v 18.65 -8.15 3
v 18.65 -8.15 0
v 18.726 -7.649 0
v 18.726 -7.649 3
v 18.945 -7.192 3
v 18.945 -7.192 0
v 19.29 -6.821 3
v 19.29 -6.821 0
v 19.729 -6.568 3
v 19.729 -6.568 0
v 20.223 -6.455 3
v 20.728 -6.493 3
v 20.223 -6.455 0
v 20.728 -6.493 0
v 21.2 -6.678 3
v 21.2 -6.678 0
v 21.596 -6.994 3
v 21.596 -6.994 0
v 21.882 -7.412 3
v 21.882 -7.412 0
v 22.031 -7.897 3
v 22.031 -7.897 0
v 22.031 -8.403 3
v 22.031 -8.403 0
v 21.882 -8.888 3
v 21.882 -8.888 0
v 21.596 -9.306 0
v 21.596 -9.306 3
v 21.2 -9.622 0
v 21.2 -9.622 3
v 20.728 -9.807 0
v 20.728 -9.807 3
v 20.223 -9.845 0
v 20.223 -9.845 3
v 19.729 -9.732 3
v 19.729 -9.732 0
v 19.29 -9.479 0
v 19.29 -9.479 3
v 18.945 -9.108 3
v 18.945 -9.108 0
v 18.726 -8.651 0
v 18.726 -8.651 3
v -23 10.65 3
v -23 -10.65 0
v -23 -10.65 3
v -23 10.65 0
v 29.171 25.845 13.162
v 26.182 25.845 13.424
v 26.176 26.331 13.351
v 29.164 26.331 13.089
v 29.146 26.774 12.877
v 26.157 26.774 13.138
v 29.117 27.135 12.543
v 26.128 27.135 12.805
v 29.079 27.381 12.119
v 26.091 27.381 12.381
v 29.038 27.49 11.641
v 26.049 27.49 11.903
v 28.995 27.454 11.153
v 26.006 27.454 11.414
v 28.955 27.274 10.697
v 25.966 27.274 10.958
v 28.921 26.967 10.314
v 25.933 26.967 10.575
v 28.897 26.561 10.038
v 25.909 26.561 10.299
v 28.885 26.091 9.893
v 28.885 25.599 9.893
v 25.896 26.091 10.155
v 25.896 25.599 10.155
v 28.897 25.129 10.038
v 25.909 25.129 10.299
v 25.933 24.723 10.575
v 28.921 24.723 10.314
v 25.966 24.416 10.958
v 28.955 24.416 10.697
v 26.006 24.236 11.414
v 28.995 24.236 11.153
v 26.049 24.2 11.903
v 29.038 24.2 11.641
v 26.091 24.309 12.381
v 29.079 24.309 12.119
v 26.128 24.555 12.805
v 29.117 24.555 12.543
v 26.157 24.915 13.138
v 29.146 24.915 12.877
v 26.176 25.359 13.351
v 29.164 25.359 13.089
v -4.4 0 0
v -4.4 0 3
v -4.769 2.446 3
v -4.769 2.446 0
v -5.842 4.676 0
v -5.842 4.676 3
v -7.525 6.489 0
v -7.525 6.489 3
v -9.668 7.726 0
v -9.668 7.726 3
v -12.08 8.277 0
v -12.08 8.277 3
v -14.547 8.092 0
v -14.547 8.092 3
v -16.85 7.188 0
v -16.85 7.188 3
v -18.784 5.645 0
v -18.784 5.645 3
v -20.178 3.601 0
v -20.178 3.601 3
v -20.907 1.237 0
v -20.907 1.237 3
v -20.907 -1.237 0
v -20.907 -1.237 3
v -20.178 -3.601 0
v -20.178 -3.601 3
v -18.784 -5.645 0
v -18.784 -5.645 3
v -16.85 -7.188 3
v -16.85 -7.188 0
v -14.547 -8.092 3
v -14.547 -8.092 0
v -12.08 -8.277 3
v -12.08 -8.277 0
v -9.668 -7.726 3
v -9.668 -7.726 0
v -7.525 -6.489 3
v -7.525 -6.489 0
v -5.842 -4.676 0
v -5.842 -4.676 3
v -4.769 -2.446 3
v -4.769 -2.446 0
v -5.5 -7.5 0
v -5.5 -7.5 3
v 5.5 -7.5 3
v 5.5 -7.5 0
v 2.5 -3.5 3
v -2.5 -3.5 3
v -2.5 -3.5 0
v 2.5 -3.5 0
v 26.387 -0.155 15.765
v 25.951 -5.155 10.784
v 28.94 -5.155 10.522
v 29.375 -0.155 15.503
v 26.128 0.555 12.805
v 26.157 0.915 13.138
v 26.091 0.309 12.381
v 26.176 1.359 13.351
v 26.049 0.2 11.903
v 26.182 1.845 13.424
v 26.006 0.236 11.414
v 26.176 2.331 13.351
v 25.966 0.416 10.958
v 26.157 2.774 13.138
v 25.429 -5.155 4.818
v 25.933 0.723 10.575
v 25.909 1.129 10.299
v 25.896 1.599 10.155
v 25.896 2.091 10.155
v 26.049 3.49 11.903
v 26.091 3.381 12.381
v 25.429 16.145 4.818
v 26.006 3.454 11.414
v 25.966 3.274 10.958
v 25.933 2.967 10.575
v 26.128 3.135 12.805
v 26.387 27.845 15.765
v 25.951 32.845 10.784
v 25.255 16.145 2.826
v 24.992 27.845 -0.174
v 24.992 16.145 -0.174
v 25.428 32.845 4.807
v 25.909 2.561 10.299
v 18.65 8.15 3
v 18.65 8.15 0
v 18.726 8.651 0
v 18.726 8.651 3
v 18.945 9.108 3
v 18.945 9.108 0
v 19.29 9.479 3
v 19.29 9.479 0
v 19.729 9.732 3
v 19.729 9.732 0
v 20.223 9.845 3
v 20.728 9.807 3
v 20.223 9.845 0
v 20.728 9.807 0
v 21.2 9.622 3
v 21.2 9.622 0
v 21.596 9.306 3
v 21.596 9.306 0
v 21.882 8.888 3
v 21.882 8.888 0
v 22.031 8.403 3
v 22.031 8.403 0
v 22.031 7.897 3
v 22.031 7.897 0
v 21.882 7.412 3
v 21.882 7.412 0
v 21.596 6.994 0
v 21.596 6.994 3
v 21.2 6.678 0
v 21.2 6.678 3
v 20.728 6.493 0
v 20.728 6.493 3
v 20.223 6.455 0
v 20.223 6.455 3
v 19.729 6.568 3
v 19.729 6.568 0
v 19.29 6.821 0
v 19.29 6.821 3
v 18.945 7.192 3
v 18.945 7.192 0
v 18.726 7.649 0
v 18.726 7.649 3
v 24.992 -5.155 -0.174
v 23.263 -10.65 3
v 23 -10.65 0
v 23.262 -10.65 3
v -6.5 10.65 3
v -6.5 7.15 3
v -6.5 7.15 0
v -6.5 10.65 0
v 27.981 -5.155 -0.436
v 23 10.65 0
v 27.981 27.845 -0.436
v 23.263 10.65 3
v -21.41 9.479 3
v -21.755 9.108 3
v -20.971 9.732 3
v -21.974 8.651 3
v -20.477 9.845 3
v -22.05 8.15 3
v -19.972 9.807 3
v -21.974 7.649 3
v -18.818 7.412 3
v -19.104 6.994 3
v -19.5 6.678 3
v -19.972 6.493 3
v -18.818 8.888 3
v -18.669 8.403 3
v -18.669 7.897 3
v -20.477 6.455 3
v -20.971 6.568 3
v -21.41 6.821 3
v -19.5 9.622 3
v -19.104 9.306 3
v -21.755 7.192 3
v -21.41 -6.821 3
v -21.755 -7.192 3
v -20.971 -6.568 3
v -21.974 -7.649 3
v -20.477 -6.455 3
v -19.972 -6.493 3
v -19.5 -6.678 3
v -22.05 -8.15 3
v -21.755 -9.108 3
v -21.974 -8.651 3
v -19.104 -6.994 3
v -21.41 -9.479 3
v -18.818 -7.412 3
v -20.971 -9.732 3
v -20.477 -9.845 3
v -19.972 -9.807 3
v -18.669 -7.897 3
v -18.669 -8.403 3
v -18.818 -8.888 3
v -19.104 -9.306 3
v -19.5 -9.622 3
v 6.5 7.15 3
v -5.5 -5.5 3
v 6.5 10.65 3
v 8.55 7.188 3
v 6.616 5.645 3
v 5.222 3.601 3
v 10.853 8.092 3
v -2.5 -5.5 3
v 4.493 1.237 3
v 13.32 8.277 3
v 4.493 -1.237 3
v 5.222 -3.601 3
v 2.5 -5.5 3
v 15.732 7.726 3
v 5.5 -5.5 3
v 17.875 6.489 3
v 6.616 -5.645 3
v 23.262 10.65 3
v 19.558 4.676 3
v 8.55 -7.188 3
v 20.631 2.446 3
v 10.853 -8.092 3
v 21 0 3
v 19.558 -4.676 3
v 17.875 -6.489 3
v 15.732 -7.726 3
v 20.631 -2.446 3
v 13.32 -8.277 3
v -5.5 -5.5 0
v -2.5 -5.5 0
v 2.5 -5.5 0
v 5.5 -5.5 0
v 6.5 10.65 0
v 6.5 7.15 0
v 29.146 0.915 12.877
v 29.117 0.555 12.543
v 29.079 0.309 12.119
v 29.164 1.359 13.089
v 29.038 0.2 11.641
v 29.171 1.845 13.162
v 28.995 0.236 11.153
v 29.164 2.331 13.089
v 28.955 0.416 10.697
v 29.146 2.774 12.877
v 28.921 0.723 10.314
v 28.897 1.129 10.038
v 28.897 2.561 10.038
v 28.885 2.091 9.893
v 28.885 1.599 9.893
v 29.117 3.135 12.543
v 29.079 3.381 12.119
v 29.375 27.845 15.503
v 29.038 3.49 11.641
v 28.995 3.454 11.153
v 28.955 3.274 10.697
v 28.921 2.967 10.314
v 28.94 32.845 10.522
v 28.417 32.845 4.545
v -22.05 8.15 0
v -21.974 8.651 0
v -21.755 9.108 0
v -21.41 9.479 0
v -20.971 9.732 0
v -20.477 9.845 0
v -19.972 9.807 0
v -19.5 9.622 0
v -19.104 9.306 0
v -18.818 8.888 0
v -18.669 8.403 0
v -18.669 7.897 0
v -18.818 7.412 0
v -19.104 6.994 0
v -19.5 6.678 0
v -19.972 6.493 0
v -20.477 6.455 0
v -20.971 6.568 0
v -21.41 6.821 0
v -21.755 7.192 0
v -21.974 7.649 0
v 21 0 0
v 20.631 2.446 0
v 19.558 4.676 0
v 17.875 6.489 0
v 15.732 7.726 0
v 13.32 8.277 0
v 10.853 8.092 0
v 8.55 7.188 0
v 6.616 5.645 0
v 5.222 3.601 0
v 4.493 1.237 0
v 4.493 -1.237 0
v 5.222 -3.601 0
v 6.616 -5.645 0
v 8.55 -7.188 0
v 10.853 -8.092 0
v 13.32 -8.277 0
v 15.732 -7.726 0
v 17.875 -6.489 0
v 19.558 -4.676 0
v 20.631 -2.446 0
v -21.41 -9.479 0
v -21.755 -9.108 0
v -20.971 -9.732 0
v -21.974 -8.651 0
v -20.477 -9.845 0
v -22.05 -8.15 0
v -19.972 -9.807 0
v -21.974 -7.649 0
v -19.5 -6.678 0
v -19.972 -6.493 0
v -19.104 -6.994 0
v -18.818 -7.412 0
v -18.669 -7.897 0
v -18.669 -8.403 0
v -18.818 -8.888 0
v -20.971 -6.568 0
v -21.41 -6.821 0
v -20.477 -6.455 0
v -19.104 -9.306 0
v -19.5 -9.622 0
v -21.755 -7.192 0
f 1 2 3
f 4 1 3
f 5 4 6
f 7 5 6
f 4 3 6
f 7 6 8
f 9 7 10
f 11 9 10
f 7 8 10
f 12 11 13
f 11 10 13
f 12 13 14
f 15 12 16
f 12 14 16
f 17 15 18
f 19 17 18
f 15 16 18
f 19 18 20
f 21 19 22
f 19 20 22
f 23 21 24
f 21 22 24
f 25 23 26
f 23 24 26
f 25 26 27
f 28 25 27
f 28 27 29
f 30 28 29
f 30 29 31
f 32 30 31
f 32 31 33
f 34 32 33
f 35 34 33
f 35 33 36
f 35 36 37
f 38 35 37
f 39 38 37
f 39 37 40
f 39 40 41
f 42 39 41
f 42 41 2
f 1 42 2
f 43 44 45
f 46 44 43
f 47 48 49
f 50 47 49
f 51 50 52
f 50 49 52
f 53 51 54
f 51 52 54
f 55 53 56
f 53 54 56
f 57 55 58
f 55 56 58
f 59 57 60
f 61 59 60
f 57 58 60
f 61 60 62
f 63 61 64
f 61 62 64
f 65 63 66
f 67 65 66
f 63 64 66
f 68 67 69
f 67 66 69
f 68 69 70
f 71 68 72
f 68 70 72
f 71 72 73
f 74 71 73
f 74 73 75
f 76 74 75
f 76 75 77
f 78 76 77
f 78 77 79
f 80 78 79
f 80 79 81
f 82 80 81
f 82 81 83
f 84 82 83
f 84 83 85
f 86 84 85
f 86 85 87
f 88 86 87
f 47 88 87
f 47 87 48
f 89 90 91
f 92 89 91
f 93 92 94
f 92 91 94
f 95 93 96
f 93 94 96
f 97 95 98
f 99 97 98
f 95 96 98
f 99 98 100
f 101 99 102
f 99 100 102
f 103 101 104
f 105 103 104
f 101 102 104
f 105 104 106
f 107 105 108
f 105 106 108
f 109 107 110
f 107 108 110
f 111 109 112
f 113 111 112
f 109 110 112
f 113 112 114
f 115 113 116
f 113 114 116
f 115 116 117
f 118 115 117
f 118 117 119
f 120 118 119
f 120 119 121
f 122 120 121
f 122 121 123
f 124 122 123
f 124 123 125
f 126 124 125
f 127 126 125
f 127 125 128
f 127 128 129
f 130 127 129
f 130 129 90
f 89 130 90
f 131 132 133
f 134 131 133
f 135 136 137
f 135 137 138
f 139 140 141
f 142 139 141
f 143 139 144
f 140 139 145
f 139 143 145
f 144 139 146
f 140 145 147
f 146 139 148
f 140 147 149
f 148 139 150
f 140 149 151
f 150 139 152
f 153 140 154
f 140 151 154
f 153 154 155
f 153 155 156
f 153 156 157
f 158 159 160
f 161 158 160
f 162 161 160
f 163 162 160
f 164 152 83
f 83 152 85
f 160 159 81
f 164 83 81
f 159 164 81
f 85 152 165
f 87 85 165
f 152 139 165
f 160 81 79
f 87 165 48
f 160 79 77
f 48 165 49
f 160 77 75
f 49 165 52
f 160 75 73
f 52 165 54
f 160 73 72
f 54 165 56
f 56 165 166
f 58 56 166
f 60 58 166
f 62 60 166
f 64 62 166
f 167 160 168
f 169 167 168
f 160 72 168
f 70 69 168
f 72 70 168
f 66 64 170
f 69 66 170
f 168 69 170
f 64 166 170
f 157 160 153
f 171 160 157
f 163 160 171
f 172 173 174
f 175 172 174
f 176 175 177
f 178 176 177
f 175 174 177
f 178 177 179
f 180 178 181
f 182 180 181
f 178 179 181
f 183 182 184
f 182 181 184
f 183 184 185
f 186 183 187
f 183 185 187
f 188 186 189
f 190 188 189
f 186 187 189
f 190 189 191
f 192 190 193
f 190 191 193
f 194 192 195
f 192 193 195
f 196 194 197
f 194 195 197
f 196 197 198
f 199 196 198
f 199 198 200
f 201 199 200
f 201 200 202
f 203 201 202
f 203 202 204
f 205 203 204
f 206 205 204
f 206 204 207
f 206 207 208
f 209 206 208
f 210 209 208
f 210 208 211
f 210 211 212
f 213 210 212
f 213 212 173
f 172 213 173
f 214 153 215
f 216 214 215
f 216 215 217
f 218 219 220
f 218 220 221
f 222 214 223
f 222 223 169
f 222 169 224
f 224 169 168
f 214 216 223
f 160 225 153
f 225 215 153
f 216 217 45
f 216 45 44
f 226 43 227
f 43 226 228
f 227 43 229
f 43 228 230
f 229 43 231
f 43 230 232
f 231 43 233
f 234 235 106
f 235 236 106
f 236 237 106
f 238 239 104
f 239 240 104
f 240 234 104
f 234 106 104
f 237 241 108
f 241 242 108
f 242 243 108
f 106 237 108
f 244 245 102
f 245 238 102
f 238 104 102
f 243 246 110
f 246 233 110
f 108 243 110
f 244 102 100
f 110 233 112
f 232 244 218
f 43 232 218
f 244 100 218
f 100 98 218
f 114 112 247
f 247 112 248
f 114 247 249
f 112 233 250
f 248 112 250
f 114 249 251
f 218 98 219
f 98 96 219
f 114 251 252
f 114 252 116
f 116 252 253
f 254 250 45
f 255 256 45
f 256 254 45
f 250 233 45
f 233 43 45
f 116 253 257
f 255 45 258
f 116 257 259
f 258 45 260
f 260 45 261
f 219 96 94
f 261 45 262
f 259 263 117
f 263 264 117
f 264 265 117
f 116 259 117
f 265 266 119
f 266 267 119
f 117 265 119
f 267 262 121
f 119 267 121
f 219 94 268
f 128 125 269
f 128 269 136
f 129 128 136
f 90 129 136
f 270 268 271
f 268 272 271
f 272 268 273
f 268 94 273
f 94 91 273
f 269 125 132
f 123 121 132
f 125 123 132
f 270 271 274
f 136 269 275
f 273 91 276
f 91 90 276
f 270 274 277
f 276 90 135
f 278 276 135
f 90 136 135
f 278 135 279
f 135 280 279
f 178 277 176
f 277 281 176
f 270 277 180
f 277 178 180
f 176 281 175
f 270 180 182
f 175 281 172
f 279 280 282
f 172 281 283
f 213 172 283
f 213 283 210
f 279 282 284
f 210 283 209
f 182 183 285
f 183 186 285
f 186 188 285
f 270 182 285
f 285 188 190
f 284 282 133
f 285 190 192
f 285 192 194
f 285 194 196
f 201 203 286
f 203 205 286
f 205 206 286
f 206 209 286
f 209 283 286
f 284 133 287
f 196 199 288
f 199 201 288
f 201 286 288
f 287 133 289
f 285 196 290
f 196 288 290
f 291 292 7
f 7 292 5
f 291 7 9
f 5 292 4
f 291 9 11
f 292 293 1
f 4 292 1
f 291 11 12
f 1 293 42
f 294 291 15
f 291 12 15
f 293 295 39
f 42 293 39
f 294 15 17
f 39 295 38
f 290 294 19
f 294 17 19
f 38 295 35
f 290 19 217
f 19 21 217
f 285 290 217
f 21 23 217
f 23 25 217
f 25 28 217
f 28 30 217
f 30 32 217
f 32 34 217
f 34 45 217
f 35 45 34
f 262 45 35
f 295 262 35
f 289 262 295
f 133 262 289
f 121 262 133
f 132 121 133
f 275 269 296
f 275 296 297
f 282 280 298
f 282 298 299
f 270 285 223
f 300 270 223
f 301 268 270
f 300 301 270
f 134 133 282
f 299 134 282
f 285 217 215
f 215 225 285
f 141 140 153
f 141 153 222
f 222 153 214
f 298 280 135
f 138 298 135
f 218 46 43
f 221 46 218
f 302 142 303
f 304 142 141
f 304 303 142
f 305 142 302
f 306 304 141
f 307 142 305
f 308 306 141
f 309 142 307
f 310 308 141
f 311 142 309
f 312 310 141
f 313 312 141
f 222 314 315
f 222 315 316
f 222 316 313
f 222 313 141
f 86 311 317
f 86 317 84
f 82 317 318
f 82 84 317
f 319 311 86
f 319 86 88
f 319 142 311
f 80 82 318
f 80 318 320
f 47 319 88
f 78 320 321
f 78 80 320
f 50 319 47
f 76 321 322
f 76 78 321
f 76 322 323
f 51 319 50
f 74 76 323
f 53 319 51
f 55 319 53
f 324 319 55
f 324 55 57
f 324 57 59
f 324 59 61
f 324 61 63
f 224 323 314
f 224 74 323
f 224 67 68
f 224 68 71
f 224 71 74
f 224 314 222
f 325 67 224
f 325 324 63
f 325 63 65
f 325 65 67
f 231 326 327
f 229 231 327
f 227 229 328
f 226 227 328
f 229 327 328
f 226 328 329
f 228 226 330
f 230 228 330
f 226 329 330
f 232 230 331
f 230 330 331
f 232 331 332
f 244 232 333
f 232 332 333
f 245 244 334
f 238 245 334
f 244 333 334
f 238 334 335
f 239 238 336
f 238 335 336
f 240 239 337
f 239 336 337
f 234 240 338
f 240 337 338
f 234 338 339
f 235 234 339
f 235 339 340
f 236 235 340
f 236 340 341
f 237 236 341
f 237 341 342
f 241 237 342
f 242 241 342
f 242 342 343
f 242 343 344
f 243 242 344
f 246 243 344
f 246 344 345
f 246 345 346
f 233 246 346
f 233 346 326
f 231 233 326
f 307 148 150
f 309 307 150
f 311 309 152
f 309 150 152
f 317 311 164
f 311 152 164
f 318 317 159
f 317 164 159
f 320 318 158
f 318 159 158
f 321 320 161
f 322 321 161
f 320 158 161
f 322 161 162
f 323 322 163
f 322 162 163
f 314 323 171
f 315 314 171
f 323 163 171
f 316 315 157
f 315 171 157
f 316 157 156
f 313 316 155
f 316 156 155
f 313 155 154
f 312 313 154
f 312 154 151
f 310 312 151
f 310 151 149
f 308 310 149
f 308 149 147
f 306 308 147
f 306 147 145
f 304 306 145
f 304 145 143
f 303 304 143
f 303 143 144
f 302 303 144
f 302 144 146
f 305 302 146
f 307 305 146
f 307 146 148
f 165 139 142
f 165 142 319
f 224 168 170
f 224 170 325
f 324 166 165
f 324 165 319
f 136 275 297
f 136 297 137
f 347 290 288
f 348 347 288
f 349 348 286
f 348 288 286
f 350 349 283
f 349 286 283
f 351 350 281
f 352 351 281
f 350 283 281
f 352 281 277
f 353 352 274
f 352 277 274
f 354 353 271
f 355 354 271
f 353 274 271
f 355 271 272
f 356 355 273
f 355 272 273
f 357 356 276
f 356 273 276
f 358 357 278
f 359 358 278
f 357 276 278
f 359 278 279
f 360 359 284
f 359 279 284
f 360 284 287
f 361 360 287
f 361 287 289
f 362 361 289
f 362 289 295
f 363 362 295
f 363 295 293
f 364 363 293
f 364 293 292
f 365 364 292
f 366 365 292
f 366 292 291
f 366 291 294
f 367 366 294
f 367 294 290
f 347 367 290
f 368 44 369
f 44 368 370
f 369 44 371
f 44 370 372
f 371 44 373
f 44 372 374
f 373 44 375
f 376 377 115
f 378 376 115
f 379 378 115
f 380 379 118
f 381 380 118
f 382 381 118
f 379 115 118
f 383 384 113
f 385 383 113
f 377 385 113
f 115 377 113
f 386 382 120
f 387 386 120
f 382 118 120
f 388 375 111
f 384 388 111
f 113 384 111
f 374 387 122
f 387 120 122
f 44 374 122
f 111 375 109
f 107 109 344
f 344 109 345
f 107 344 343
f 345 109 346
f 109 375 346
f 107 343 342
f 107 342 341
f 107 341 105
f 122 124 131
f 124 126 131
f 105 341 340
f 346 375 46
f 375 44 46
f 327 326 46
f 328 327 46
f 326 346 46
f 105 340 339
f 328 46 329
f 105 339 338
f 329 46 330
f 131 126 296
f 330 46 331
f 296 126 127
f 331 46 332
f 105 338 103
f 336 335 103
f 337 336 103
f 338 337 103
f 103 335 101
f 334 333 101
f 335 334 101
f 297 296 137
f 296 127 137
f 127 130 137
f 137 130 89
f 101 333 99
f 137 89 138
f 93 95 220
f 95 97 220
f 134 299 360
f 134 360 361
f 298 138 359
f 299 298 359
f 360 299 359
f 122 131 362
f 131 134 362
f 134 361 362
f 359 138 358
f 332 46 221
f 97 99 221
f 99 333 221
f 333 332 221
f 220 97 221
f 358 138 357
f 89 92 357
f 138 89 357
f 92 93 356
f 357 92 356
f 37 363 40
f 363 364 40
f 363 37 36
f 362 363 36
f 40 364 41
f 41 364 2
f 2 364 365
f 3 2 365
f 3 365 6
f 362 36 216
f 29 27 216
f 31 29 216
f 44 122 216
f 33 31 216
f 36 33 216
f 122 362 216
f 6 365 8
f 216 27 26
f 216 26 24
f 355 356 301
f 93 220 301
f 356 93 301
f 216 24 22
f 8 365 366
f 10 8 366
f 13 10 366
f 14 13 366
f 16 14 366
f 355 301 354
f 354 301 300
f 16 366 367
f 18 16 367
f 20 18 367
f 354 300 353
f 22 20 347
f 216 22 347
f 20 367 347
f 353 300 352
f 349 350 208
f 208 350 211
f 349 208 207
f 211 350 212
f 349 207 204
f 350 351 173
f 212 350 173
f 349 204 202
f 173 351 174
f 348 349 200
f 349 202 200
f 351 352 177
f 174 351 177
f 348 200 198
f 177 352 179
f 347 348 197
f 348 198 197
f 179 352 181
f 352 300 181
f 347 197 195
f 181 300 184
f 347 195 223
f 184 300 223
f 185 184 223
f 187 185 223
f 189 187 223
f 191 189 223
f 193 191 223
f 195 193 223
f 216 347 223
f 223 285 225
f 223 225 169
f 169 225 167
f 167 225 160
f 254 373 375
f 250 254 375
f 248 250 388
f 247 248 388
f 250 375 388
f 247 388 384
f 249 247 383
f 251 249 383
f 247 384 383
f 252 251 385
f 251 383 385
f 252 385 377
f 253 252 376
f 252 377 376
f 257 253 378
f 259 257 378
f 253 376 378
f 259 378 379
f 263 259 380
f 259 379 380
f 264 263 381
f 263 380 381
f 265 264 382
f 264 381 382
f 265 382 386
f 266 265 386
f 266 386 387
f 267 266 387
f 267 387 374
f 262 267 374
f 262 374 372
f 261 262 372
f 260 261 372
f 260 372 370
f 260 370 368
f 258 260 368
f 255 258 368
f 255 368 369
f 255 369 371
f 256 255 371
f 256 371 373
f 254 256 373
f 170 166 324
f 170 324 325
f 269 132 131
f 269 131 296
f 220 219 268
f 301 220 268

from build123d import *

# Parameters (mm, degrees)
SKETCH_1_W          = 46
SKETCH_1_H          = 21.3
EXTRUDE_1_DEPTH     = 3
SKETCH_2_R          = 8.3
CUT_EXTRUDE_1_DEPTH = 26.522979842
SKETCH_3_W          = 8
SKETCH_3_H          = 3
CUT_EXTRUDE_2_DEPTH = 26.522979842
SKETCH_4_W          = 5
SKETCH_4_H          = 4
CUT_EXTRUDE_3_DEPTH = 26.522979842
SKETCH_5_W          = 3
SKETCH_5_H          = 2
SKETCH_5_W_2        = 2
SKETCH_5_H_2        = 3
CUT_EXTRUDE_4_DEPTH = 1
HOLE_WIZARD_M3_1_D  = 3.4
SKETCH4_W           = 11
SKETCH4_H           = 2
SKETCH4_W_2         = 13
SKETCH4_H_2         = 3.5
CUT_EXTRUDE3_DEPTH  = 26.522979842
BOSS_EXTRUDE2_DEPTH = 21.3
SKETCH7_W           = 3.011459513
SKETCH7_H           = 21.3
BOSS_EXTRUDE3_DEPTH = 2
SKETCH10_W          = 2
SKETCH10_H          = 28.7
BOSS_EXTRUDE5_DEPTH = 3.011459513
CUT_EXTRUDE6_DEPTH  = 47.808991188
SKETCH14_W          = 16
SKETCH14_H          = 38
BOSS_EXTRUDE8_DEPTH = 3
CHAMFER2_SIZE       = 2
SKETCH15_R          = 1.65
CUT_EXTRUDE7_DEPTH  = 61.720869721
CHAMFER3_SIZE       = 5


with BuildPart() as part:
    # 草圖1 → 填料-伸長1 (new body)
    with BuildSketch(Plane.XY):
        Rectangle(SKETCH_1_W, SKETCH_1_H)
    extrude(amount=EXTRUDE_1_DEPTH)

    # 草圖2 → 除料-伸長1 (cut, through all)
    with BuildSketch(Plane.XY.offset(3)):
        with Locations((-12.7, 0)):
            Circle(SKETCH_2_R)
        with Locations((12.7, 0)):
            Circle(SKETCH_2_R)
    extrude(amount=-CUT_EXTRUDE_1_DEPTH, mode=Mode.SUBTRACT)

    # 草圖3 → 除料-伸長2 (cut, through all)
    with BuildSketch(Plane.XY.offset(3)):
        with Locations((0, 9.15)):
            Rectangle(SKETCH_3_W, SKETCH_3_H)
    extrude(amount=-CUT_EXTRUDE_2_DEPTH, mode=Mode.SUBTRACT)

    # 草圖4 → 除料-伸長3 (cut, through all)
    with BuildSketch(Plane.XY.offset(3)):
        with Locations((0, -5.5)):
            Rectangle(SKETCH_4_W, SKETCH_4_H)
    extrude(amount=-CUT_EXTRUDE_3_DEPTH, mode=Mode.SUBTRACT)

    # 草圖5 → 除料-伸長4 (cut)
    with BuildSketch(Plane.XY.offset(3)):
        with Locations((4, -6.5)):
            Rectangle(SKETCH_5_W, SKETCH_5_H)
        with Locations((-5.5, 8.65)):
            Rectangle(SKETCH_5_W_2, SKETCH_5_H_2)
        with Locations((5.5, 8.65)):
            Rectangle(SKETCH_5_W_2, SKETCH_5_H_2)
        with Locations((-4, -6.5)):
            Rectangle(SKETCH_5_W, SKETCH_5_H)
    extrude(amount=-CUT_EXTRUDE_4_DEPTH, mode=Mode.SUBTRACT)

    # M3 餘隙孔1 (through all)
    with Locations(Plane.XY.offset(3)):
        with Locations((20.35, 8.15), (-20.35, -8.15), (-20.35, 8.15), (20.35, -8.15)):
            Hole(HOLE_WIZARD_M3_1_D / 2)

    # Sketch4 → Cut-Extrude3 (cut, through all)
    with BuildSketch(Plane.XY.offset(3)):
        with Locations((0, -6.5)):
            Rectangle(SKETCH4_W, SKETCH4_H)
        with Locations((0, 8.9)):
            Rectangle(SKETCH4_W_2, SKETCH4_H_2)
    extrude(amount=-CUT_EXTRUDE3_DEPTH, mode=Mode.SUBTRACT)

    # Sketch5 → Boss-Extrude2 (add)
    with BuildSketch(Plane(origin=(0, -10.65, 0), x_dir=(-1, 0, 0), z_dir=(0, -1, 0))):
        Polygon((-23, 0), (-23, -3), (-23.262465991, -3), align=None)
    extrude(amount=-BOSS_EXTRUDE2_DEPTH)

    # Sketch7 → Boss-Extrude3 (add)
    with BuildSketch(Plane(origin=(22.82528916, 0, -1.996954043), x_dir=(-0.08715574274765041, 0, -0.9961946980917462), z_dir=(0.9961946980917462, 0, -0.08715574274765041))):
        with Locations((-3.510311839, 0)):
            Rectangle(SKETCH7_W, SKETCH7_H)
    extrude(amount=BOSS_EXTRUDE3_DEPTH)

    # Sketch10 → Boss-Extrude5 (add)
    with BuildSketch(Plane(origin=(0.437176831, 0, 4.996954043), x_dir=(0.9961946980917463, 0, -0.08715574274765044), z_dir=(0.08715574274765044, 0, 0.9961946980917463))):
        with Locations((23.912478056, 25)):
            Rectangle(SKETCH10_W, SKETCH10_H)
    extrude(amount=-BOSS_EXTRUDE5_DEPTH)

    # Sketch12 → Cut-Extrude6 (cut, through all)
    with BuildSketch(Plane(origin=(0.437176831, 0, 4.996954043), x_dir=(0.9961946980917463, 0, -0.08715574274765044), z_dir=(0.08715574274765044, 0, 0.9961946980917463))):
        Polygon((24.912478056, -5.155045161), (22.912478056, -10.65), (24.912478056, -10.65), align=None)
        Polygon((22.912478056, 39.35), (22.912478056, 10.65), (24.912478056, 16.144954839), (24.912478056, 39.35), align=None)
    extrude(amount=-CUT_EXTRUDE6_DEPTH, mode=Mode.SUBTRACT)

    # Sketch14 → Boss-Extrude8 (add)
    with BuildSketch(Plane(origin=(24.817678556, 0, -2.171265529), x_dir=(-0.08715574274765041, 0, -0.9961946980917462), z_dir=(0.9961946980917462, 0, -0.08715574274765041))):
        with Locations((-10.004582083, 13.844954839)):
            Rectangle(SKETCH14_W, SKETCH14_H)
    extrude(amount=BOSS_EXTRUDE8_DEPTH)

    # Chamfer2
    chamfer2_edges = [part.edges().sort_by_distance(p)[0] for p in [
        (25.254855387, 5.494954839, 2.825688515),
    ]]
    chamfer(chamfer2_edges, length=CHAMFER2_SIZE - 0.0001)  # a hair under: the kernel refuses the full size

    # Sketch15 → Cut-Extrude7 (cut, through all)
    with BuildSketch(Plane(origin=(24.817678556, 0, -2.171265529), x_dir=(0.08715574274765048, 0, 0.9961946980917462), z_dir=(-0.9961946980917462, 0, 0.08715574274765048))):
        with Locations((14.004582083, 25.844954839)):
            Circle(SKETCH15_R)
        with Locations((14.004582083, 1.844954839)):
            Circle(SKETCH15_R)
    extrude(amount=-CUT_EXTRUDE7_DEPTH, mode=Mode.SUBTRACT)

    # Chamfer3
    chamfer3_edges = [part.edges().sort_by_distance(p)[0] for p in [
        (26.486681443, 32.844954839, -0.3050451),
        (27.881173327, 32.844954839, 15.63407007),
        (27.881173327, -5.155045161, 15.63407007),
    ]]
    chamfer(chamfer3_edges, length=CHAMFER3_SIZE)


solid = part.part
